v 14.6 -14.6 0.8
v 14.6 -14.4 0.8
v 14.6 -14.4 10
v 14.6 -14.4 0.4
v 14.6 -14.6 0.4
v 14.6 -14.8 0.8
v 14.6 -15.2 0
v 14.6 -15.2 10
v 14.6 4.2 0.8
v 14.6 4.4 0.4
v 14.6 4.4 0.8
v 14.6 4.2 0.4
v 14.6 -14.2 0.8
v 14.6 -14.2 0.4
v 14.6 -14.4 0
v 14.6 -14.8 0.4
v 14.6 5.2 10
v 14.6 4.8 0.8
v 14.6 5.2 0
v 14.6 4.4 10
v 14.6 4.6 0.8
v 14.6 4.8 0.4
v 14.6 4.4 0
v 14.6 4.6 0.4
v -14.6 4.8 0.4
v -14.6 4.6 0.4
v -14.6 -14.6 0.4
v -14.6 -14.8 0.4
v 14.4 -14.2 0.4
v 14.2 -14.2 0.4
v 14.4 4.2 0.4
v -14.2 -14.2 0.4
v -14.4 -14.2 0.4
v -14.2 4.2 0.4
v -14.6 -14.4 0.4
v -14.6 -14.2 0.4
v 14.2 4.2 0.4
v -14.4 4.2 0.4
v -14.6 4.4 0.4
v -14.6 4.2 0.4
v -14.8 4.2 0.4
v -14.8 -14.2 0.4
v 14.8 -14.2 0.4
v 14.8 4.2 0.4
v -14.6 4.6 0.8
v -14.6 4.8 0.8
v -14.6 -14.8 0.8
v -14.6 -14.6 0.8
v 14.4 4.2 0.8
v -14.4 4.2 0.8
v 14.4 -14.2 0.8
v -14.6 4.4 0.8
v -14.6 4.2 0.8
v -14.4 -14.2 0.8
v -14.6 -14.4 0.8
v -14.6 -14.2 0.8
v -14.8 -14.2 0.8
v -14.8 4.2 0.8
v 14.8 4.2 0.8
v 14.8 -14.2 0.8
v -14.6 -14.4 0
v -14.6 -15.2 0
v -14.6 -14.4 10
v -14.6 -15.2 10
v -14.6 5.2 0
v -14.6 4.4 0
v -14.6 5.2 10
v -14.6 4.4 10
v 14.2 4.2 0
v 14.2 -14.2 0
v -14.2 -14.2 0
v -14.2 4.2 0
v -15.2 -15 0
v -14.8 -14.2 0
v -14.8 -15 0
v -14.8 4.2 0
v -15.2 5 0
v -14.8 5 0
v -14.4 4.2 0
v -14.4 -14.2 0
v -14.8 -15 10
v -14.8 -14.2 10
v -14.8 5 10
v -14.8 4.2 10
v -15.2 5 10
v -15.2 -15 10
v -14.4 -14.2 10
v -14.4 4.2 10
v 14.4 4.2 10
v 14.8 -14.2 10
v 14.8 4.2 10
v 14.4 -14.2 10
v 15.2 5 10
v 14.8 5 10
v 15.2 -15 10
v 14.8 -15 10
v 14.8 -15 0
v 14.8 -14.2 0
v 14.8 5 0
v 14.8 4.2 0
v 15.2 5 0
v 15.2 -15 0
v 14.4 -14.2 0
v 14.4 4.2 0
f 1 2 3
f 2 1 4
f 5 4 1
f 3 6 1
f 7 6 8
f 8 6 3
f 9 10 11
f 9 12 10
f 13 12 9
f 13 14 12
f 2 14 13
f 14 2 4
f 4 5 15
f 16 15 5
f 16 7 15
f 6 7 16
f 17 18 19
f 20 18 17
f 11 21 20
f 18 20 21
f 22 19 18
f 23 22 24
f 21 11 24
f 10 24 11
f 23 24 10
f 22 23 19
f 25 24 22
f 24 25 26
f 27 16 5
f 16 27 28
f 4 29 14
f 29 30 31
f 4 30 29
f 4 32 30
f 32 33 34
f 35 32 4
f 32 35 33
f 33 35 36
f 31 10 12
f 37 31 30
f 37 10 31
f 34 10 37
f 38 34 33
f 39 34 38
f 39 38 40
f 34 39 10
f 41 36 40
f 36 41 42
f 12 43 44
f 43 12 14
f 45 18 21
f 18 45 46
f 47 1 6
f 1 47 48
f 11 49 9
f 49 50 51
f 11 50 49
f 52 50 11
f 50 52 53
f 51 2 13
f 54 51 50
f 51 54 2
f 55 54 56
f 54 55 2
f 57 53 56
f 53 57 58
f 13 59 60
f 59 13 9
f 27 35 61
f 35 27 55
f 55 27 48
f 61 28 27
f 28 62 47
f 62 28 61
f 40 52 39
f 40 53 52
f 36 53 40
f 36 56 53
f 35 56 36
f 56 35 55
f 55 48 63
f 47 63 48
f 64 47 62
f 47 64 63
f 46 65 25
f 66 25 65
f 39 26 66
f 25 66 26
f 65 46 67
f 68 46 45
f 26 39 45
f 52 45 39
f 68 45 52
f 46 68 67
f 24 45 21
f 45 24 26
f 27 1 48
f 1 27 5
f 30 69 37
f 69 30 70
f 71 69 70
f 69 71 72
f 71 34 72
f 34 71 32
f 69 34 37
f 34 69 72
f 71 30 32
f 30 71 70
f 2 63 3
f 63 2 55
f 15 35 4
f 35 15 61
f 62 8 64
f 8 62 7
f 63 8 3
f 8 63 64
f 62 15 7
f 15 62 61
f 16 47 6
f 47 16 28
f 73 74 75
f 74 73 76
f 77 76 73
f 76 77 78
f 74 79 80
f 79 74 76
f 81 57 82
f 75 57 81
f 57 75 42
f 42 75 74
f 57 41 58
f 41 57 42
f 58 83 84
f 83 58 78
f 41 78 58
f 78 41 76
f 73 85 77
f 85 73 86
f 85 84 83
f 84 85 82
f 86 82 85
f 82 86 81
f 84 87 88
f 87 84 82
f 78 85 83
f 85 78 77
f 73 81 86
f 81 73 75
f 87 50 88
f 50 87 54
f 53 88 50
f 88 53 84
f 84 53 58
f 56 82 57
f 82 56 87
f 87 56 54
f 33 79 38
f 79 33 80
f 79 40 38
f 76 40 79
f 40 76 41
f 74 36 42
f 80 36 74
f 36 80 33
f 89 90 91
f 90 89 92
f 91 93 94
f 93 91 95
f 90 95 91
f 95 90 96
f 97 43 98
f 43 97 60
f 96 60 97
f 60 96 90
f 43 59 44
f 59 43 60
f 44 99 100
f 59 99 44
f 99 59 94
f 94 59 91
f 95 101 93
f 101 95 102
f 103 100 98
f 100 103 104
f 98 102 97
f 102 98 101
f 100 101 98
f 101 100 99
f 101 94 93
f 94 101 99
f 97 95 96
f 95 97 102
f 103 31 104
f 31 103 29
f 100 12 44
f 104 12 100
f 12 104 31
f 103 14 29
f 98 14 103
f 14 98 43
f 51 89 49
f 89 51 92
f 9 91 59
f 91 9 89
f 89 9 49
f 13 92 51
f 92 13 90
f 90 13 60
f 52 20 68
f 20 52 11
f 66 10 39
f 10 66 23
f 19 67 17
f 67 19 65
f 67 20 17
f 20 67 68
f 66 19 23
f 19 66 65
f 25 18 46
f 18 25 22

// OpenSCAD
//!OpenSCAD

Box_width_X = 300;
Box_depth_Y = 200;
Box_height_Z = 100;
Stock_thickness = 8;
Lid_type = "None"; // ["None", "Sliding"]
Display_part = "All"; // ["Bottom", "Front", "Left-side", "Right-side", "Back", "Lid"]
Preview_in_3D = true;

/* [Hidden] */
Lid_position = 0;
Spacing = 2;


Scaling_factor = 0.1;
item = 0;

module Back() {
  difference() {
    translate([(Stock_thickness / 2), 0, 0]){
      cube([(Box_width_X - Stock_thickness), Box_height_Z, Stock_thickness], center=false);
    }

    translate([0, (Stock_thickness / 2), (Stock_thickness / 2)]){
      cube([Box_width_X, (Stock_thickness / 2), Stock_thickness], center=false);
    }
    if (Lid_type == "Sliding") {
      translate([0, (Box_height_Z - Stock_thickness), (Stock_thickness / 2)]){
        cube([Box_width_X, (Stock_thickness / 2), Stock_thickness], center=false);
      }
    }

  }
}

module Front() {
  difference() {
    if (Lid_type == "Sliding") {
      translate([(Stock_thickness / 2), 0, 0]){
        cube([(Box_width_X - Stock_thickness), (Box_height_Z - Stock_thickness), Stock_thickness], center=false);
      }
    } else {
      translate([(Stock_thickness / 2), 0, 0]){
        cube([(Box_width_X - Stock_thickness), Box_height_Z, Stock_thickness], center=false);
      }
    }

    translate([0, (Stock_thickness / 2), (Stock_thickness / 2)]){
      cube([Box_width_X, (Stock_thickness / 2), Stock_thickness], center=false);
    }
  }
}

module Bottom() {
  translate([(Stock_thickness / 2), (Stock_thickness / 2), 0]){
    union(){
      cube([(Box_width_X - Stock_thickness), (Box_depth_Y - Stock_thickness), (Stock_thickness / 2)], center=false);
      translate([(Stock_thickness / 2), (Stock_thickness / 2), 0]){
        cube([(Box_width_X - Stock_thickness * 2), (Box_depth_Y - Stock_thickness * 2), Stock_thickness], center=false);
      }
    }
  }
}

module Left_side() {
  union(){
    cube([Box_height_Z, Box_depth_Y, (Stock_thickness / 2)], center=false);
    if (Lid_type == "Sliding") {
      cube([(Stock_thickness / 2), (Box_depth_Y - Stock_thickness), Stock_thickness], center=false);
    }

    if (Lid_type == "Sliding") {
      translate([Stock_thickness, Stock_thickness, 0]){
        cube([(Box_height_Z - Stock_thickness * 2), (Box_depth_Y - Stock_thickness * 2), Stock_thickness], center=false);
      }
    } else {
      translate([0, Stock_thickness, 0]){
        cube([(Box_height_Z - Stock_thickness), (Box_depth_Y - Stock_thickness * 2), Stock_thickness], center=false);
      }
    }

    translate([(Box_height_Z - Stock_thickness / 2), Stock_thickness, 0]){
      cube([(Stock_thickness / 2), (Box_depth_Y - Stock_thickness * 2), Stock_thickness], center=false);
    }
  }
}

module Right_side() {
  union(){
    cube([Box_height_Z, Box_depth_Y, (Stock_thickness / 2)], center=false);
    translate([0, Stock_thickness, 0]){
      cube([(Stock_thickness / 2), (Box_depth_Y - Stock_thickness * 2), Stock_thickness], center=false);
    }
    translate([Stock_thickness, Stock_thickness, 0]){
      if (Lid_type == "Sliding") {
        cube([(Box_height_Z - Stock_thickness * 2), (Box_depth_Y - Stock_thickness * 2), Stock_thickness], center=false);
      } else {
        cube([(Box_height_Z - Stock_thickness), (Box_depth_Y - Stock_thickness * 2), Stock_thickness], center=false);
      }

    }
    if (Lid_type == "Sliding") {
      translate([(Box_height_Z - Stock_thickness / 2), 0, 0]){
        cube([(Stock_thickness / 2), (Box_depth_Y - Stock_thickness), Stock_thickness], center=false);
      }
    }

  }
}

module Lid() {
  if (Lid_type == "Sliding") {
    translate([(Stock_thickness / 2), 0, 0]){
      union(){
        cube([(Box_width_X - Stock_thickness), (Box_depth_Y - Stock_thickness / 2), (Stock_thickness / 2)], center=false);
        translate([(Stock_thickness / 2), 0, 0]){
          cube([(Box_width_X - Stock_thickness * 2), (Box_depth_Y - Stock_thickness), Stock_thickness], center=false);
        }
      }
    }
  }

}

translate([(-((Scaling_factor / 2) * Box_width_X)), (-((Scaling_factor / 2) * Box_width_X)), 0]){
  scale([Scaling_factor, Scaling_factor, Scaling_factor]){
    if (Preview_in_3D == true) {
      union(){
        translate([0, 0, Stock_thickness]){
          mirror([0,0,1]){
            if (Display_part == "All" || Display_part == "Bottom") {
              Bottom();
            }

          }
        }
        rotate([90, 0, 0]){
          mirror([0,0,1]){
            translate([0, 0, (-Spacing)]){
              if (Display_part == "All" || Display_part == "Front") {
                Front();
              }

            }
          }
        }
        translate([(-Spacing), 0, Box_height_Z]){
          rotate([0, 90, 0]){
            if (Display_part == "All" || Display_part == "Left-side") {
              Left_side();
            }

          }
        }
        translate([(Box_width_X + Spacing), 0, 0]){
          rotate([0, 270, 0]){
            if (Display_part == "All" || Display_part == "Right-side") {
              Right_side();
            }

          }
        }
        translate([0, (Box_depth_Y + Spacing), 0]){
          rotate([90, 0, 0]){
            if (Display_part == "All" || Display_part == "Back") {
              Back();
            }

          }
        }
        translate([0, (-((Lid_position / 100) * Box_depth_Y)), (Box_height_Z - Stock_thickness)]){
          if (Display_part == "All" || Display_part == "Lid") {
            Lid();
          }

        }
      }
    } else {
      union(){
        if (Display_part == "All") {
          translate([30, 30, 0]){
            Bottom();
          }
        } else if (Display_part == "Bottom") {
          Bottom();
        }

        if (Display_part == "All") {
          translate([30, (Box_depth_Y + 114), 0]){
            Front();
          }
        } else if (Display_part == "Front") {
          Front();
        }

        if (Display_part == "All") {
          translate([30, ((Box_depth_Y + Box_height_Z) + 171), 0]){
            Left_side();
          }
        } else if (Display_part == "Left-side") {
          Left_side();
        }

        if (Display_part == "All") {
          translate([(Box_width_X + 90), ((Box_depth_Y + Box_height_Z) + 171), 0]){
            Right_side();
          }
        } else if (Display_part == "Right-side") {
          Right_side();
        }

        if (Display_part == "All") {
          translate([(Box_width_X + 90), (Box_depth_Y + 114), 0]){
            Back();
          }
        } else if (Display_part == "Back") {
          Back();
        }

        if (Display_part == "All") {
          translate([(Box_width_X + 90), 30, 0]){
            Lid();
          }
        } else if (Display_part == "Lid") {
          Lid();
        }

      }
    }

  }
}
